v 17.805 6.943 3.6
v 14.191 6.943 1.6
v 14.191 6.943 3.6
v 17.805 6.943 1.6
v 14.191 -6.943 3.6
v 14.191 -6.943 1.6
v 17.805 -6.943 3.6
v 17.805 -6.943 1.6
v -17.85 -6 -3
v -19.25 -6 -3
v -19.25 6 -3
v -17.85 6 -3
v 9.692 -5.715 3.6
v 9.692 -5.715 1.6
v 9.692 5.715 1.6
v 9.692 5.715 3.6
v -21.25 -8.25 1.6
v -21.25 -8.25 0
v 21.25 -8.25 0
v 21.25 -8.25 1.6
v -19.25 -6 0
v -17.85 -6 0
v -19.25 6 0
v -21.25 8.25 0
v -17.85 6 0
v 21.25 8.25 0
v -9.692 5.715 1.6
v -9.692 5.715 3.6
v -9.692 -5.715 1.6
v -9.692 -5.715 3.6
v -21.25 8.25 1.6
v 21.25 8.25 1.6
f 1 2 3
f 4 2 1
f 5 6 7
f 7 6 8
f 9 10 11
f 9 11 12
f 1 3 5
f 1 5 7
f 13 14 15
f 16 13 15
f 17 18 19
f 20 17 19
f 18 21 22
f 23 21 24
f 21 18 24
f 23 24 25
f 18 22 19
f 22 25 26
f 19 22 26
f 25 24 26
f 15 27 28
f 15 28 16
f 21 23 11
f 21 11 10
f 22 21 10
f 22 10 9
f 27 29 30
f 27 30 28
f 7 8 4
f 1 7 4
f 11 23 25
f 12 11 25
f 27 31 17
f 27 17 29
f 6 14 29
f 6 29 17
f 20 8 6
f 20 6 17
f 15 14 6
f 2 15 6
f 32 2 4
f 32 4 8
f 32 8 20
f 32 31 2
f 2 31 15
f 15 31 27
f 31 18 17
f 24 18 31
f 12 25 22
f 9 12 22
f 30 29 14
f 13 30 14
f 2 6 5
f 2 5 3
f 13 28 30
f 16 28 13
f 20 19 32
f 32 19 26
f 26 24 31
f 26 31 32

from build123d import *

# Parameters (mm, degrees)
F0_W     = 42.5
F0_H     = 16.5
F1_DEPTH = 1.6
F2_W     = 19.383784
F2_H     = 11.430836
F2_W_2   = 3.613464
F2_H_2   = 13.885942
F3_DEPTH = 2
F4_W     = 1.4
F4_H     = 12
F5_DEPTH = 3


with BuildPart() as f1:
    # F0 (on Top) → F1 (new body)
    with BuildSketch(Plane.XY):
        Rectangle(F0_W, F0_H)
    extrude(amount=F1_DEPTH)

    # F2 (on face) → F3 (join)
    with BuildSketch(Plane.XY.offset(1.6)):
        Rectangle(F2_W, F2_H)
        with Locations((15.997825, 0)):
            Rectangle(F2_W_2, F2_H_2)
    extrude(amount=F3_DEPTH)

    # F4 (on face) → F5 (join)
    with BuildSketch(Plane(origin=(0, 0, 0), x_dir=(1, 0, 0), z_dir=(0, 0, -1))):
        with Locations((-18.55, 0)):
            Rectangle(F4_W, F4_H)
    extrude(amount=F5_DEPTH)


solid = f1.part
